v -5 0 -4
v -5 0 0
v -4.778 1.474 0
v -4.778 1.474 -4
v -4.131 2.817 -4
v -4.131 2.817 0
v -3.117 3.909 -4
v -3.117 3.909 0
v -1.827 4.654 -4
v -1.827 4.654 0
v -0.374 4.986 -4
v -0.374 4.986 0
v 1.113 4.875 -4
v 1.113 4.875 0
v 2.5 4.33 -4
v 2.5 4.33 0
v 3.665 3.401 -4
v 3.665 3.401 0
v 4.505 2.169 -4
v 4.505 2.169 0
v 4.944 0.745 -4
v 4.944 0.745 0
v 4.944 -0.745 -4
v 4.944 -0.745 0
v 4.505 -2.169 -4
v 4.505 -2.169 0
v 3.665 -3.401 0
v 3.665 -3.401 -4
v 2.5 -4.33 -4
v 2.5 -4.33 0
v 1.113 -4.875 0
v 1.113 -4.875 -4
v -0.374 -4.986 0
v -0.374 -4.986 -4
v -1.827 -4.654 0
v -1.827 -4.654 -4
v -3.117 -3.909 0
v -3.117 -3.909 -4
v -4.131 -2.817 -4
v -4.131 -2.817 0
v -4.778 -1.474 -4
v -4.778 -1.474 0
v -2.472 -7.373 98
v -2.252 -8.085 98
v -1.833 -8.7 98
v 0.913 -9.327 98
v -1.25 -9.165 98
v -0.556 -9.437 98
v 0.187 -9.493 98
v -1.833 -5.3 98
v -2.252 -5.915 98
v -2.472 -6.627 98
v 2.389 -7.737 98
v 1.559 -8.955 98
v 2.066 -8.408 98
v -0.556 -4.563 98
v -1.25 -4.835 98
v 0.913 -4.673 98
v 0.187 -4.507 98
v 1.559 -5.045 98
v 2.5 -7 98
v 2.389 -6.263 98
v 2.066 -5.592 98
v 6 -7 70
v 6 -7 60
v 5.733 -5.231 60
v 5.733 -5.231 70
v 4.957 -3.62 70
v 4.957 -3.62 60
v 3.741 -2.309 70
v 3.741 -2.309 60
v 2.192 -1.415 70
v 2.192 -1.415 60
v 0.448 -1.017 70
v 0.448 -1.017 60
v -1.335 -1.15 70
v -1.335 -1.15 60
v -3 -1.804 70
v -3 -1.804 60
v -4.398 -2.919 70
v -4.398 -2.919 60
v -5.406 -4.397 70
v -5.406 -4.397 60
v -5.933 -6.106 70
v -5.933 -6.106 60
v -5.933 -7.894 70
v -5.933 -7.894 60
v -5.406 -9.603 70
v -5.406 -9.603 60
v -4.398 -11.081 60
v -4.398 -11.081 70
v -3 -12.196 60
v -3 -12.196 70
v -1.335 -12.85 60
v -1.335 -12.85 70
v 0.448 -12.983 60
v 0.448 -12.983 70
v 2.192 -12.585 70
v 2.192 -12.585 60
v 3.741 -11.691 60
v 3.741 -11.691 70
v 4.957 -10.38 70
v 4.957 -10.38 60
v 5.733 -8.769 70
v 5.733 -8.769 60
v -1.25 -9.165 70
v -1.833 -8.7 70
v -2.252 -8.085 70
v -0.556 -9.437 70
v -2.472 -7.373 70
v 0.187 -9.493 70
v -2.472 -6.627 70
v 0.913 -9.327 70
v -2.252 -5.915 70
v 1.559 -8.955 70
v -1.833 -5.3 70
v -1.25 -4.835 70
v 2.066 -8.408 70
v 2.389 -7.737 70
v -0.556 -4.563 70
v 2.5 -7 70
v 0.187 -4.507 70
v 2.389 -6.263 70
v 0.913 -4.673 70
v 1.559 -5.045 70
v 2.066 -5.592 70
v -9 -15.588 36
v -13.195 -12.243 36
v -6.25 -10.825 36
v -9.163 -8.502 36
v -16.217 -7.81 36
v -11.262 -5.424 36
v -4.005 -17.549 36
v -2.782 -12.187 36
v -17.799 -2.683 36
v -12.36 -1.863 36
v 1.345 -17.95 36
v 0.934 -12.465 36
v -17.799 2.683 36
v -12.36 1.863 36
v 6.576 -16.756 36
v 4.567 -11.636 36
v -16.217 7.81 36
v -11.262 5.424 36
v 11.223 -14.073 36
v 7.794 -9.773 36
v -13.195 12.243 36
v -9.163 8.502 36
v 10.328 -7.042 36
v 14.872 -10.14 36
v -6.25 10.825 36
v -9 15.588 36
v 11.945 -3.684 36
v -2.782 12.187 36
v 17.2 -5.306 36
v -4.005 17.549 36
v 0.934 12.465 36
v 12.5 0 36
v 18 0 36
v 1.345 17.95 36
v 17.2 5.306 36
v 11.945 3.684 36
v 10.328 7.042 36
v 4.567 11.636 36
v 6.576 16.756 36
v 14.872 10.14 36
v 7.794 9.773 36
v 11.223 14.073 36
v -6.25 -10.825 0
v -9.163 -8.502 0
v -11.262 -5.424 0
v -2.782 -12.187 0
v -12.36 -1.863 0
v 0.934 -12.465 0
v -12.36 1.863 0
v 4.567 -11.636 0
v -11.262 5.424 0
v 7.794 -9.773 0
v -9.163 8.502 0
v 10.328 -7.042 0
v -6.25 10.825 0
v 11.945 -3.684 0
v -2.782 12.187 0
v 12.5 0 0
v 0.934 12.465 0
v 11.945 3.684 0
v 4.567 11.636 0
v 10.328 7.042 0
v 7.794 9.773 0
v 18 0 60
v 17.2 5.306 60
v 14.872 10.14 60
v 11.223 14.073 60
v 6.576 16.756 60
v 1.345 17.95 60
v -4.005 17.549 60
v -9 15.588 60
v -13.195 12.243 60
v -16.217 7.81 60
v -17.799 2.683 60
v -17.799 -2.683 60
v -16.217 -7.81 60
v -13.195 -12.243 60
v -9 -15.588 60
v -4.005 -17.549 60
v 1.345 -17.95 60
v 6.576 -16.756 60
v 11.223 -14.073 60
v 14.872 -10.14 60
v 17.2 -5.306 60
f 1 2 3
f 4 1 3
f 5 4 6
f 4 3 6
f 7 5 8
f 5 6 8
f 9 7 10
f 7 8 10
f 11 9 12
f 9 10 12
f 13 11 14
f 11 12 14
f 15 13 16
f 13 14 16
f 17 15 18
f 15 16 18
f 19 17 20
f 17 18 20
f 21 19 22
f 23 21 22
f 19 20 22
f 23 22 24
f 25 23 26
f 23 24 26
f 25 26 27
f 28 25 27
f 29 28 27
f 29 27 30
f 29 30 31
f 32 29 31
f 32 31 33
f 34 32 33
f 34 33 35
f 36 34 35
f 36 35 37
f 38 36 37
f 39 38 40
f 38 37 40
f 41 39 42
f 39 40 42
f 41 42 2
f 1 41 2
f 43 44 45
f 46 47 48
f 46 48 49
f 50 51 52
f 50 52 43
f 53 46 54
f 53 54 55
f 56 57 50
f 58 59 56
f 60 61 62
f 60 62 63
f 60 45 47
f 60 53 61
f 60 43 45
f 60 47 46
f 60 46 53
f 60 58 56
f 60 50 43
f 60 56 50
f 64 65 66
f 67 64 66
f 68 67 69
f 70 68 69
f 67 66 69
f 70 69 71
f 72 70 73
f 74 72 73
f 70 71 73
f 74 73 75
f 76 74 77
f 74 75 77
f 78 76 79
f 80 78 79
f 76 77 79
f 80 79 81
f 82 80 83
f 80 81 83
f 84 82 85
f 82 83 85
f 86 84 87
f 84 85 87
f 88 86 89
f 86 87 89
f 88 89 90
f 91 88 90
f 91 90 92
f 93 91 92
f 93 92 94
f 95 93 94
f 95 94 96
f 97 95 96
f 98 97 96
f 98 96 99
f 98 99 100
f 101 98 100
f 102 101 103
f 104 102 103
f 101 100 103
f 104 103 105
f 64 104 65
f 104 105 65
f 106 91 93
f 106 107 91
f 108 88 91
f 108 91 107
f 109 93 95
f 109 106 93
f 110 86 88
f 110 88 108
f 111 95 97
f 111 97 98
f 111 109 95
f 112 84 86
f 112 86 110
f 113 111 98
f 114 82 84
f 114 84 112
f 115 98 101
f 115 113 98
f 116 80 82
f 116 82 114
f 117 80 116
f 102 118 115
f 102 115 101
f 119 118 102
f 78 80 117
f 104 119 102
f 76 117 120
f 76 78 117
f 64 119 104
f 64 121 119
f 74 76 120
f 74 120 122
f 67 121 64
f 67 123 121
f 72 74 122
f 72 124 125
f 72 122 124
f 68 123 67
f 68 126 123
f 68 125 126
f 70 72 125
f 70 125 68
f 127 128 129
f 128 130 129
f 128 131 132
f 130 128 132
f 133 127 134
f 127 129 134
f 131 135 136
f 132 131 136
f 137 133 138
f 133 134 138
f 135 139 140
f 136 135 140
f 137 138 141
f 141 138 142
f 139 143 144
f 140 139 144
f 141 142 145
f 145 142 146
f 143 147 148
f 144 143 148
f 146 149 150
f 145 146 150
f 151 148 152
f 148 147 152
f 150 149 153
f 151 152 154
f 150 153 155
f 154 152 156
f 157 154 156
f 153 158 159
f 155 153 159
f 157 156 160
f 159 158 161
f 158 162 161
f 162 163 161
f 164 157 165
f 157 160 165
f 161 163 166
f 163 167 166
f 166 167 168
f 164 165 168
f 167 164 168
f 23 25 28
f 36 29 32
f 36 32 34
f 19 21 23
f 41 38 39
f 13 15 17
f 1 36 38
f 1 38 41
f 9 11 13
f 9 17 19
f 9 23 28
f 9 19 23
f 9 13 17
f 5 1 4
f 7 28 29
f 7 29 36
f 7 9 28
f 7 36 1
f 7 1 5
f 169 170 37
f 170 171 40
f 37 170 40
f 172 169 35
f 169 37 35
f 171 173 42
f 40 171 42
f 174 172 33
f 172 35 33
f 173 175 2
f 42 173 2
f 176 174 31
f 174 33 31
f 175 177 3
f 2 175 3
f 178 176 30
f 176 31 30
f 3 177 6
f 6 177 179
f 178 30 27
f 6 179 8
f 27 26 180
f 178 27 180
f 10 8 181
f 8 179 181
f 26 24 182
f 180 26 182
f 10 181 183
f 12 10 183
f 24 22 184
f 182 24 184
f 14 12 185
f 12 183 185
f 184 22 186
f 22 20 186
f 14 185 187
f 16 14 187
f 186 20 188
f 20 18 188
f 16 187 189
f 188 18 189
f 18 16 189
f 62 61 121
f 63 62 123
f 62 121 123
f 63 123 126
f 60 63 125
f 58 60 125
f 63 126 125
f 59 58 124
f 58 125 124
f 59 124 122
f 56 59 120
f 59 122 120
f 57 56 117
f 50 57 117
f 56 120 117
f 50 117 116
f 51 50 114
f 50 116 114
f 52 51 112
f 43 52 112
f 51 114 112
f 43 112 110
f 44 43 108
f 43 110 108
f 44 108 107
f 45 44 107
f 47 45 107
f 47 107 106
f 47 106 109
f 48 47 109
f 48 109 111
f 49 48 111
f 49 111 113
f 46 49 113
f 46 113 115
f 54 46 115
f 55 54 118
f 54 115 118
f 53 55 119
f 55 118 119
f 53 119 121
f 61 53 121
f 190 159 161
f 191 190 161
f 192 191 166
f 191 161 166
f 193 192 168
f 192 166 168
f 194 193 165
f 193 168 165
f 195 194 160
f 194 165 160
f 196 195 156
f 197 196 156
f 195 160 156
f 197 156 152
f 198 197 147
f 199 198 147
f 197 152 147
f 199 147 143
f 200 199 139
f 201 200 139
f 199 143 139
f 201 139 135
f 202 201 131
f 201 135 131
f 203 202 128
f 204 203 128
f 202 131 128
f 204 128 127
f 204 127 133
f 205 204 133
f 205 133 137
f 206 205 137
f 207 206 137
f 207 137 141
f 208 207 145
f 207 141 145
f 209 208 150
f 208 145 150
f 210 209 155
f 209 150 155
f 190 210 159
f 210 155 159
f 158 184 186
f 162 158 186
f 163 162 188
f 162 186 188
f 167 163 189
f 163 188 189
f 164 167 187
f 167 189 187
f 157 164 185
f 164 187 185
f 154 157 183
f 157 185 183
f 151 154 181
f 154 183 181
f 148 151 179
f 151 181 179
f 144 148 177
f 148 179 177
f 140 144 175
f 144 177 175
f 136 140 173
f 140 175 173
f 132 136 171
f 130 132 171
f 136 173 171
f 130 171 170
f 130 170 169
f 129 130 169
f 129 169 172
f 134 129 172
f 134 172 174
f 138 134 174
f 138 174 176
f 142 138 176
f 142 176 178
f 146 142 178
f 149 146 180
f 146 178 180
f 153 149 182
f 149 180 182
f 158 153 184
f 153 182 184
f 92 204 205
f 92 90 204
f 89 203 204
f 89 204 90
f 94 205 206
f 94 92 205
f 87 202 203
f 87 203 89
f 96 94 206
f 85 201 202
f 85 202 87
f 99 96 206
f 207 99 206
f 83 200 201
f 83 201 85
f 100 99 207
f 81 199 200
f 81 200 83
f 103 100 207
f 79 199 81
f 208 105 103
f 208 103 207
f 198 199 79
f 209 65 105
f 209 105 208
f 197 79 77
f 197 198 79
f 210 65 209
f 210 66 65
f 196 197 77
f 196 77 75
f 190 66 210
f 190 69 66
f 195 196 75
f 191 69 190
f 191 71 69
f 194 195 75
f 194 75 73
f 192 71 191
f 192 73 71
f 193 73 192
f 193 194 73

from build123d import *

# Parameters (mm, degrees)
SKETCH1_R           = 12.5
BOSS_EXTRUDE1_DEPTH = 36
SKETCH2_R           = 5
BOSS_EXTRUDE2_DEPTH = 4
SKETCH3_R           = 18
BOSS_EXTRUDE3_DEPTH = 24
SKETCH5_R           = 6
BOSS_EXTRUDE4_DEPTH = 10
SKETCH7_R           = 2.5
BOSS_EXTRUDE5_DEPTH = 28


with BuildPart() as part:
    # Sketch1 → Boss-Extrude1 (new body)
    with BuildSketch(Plane.XY):
        Circle(SKETCH1_R)
    extrude(amount=BOSS_EXTRUDE1_DEPTH)

    # Sketch2 → Boss-Extrude2 (add)
    with BuildSketch(Plane(origin=(0, 0, 0), x_dir=(-1, 0, 0), z_dir=(0, 0, -1))):
        Circle(SKETCH2_R)
    extrude(amount=BOSS_EXTRUDE2_DEPTH)

    # Sketch3 → Boss-Extrude3 (add)
    with BuildSketch(Plane.XY.offset(36)):
        Circle(SKETCH3_R)
    extrude(amount=BOSS_EXTRUDE3_DEPTH)

    # Sketch5 → Boss-Extrude4 (add)
    with BuildSketch(Plane.XY.offset(60)):
        with Locations((0, -7)):
            Circle(SKETCH5_R)
    extrude(amount=BOSS_EXTRUDE4_DEPTH)

    # Sketch7 → Boss-Extrude5 (add)
    with BuildSketch(Plane.XY.offset(70)):
        with Locations((0, -7)):
            Circle(SKETCH7_R)
    extrude(amount=BOSS_EXTRUDE5_DEPTH)


solid = part.part
